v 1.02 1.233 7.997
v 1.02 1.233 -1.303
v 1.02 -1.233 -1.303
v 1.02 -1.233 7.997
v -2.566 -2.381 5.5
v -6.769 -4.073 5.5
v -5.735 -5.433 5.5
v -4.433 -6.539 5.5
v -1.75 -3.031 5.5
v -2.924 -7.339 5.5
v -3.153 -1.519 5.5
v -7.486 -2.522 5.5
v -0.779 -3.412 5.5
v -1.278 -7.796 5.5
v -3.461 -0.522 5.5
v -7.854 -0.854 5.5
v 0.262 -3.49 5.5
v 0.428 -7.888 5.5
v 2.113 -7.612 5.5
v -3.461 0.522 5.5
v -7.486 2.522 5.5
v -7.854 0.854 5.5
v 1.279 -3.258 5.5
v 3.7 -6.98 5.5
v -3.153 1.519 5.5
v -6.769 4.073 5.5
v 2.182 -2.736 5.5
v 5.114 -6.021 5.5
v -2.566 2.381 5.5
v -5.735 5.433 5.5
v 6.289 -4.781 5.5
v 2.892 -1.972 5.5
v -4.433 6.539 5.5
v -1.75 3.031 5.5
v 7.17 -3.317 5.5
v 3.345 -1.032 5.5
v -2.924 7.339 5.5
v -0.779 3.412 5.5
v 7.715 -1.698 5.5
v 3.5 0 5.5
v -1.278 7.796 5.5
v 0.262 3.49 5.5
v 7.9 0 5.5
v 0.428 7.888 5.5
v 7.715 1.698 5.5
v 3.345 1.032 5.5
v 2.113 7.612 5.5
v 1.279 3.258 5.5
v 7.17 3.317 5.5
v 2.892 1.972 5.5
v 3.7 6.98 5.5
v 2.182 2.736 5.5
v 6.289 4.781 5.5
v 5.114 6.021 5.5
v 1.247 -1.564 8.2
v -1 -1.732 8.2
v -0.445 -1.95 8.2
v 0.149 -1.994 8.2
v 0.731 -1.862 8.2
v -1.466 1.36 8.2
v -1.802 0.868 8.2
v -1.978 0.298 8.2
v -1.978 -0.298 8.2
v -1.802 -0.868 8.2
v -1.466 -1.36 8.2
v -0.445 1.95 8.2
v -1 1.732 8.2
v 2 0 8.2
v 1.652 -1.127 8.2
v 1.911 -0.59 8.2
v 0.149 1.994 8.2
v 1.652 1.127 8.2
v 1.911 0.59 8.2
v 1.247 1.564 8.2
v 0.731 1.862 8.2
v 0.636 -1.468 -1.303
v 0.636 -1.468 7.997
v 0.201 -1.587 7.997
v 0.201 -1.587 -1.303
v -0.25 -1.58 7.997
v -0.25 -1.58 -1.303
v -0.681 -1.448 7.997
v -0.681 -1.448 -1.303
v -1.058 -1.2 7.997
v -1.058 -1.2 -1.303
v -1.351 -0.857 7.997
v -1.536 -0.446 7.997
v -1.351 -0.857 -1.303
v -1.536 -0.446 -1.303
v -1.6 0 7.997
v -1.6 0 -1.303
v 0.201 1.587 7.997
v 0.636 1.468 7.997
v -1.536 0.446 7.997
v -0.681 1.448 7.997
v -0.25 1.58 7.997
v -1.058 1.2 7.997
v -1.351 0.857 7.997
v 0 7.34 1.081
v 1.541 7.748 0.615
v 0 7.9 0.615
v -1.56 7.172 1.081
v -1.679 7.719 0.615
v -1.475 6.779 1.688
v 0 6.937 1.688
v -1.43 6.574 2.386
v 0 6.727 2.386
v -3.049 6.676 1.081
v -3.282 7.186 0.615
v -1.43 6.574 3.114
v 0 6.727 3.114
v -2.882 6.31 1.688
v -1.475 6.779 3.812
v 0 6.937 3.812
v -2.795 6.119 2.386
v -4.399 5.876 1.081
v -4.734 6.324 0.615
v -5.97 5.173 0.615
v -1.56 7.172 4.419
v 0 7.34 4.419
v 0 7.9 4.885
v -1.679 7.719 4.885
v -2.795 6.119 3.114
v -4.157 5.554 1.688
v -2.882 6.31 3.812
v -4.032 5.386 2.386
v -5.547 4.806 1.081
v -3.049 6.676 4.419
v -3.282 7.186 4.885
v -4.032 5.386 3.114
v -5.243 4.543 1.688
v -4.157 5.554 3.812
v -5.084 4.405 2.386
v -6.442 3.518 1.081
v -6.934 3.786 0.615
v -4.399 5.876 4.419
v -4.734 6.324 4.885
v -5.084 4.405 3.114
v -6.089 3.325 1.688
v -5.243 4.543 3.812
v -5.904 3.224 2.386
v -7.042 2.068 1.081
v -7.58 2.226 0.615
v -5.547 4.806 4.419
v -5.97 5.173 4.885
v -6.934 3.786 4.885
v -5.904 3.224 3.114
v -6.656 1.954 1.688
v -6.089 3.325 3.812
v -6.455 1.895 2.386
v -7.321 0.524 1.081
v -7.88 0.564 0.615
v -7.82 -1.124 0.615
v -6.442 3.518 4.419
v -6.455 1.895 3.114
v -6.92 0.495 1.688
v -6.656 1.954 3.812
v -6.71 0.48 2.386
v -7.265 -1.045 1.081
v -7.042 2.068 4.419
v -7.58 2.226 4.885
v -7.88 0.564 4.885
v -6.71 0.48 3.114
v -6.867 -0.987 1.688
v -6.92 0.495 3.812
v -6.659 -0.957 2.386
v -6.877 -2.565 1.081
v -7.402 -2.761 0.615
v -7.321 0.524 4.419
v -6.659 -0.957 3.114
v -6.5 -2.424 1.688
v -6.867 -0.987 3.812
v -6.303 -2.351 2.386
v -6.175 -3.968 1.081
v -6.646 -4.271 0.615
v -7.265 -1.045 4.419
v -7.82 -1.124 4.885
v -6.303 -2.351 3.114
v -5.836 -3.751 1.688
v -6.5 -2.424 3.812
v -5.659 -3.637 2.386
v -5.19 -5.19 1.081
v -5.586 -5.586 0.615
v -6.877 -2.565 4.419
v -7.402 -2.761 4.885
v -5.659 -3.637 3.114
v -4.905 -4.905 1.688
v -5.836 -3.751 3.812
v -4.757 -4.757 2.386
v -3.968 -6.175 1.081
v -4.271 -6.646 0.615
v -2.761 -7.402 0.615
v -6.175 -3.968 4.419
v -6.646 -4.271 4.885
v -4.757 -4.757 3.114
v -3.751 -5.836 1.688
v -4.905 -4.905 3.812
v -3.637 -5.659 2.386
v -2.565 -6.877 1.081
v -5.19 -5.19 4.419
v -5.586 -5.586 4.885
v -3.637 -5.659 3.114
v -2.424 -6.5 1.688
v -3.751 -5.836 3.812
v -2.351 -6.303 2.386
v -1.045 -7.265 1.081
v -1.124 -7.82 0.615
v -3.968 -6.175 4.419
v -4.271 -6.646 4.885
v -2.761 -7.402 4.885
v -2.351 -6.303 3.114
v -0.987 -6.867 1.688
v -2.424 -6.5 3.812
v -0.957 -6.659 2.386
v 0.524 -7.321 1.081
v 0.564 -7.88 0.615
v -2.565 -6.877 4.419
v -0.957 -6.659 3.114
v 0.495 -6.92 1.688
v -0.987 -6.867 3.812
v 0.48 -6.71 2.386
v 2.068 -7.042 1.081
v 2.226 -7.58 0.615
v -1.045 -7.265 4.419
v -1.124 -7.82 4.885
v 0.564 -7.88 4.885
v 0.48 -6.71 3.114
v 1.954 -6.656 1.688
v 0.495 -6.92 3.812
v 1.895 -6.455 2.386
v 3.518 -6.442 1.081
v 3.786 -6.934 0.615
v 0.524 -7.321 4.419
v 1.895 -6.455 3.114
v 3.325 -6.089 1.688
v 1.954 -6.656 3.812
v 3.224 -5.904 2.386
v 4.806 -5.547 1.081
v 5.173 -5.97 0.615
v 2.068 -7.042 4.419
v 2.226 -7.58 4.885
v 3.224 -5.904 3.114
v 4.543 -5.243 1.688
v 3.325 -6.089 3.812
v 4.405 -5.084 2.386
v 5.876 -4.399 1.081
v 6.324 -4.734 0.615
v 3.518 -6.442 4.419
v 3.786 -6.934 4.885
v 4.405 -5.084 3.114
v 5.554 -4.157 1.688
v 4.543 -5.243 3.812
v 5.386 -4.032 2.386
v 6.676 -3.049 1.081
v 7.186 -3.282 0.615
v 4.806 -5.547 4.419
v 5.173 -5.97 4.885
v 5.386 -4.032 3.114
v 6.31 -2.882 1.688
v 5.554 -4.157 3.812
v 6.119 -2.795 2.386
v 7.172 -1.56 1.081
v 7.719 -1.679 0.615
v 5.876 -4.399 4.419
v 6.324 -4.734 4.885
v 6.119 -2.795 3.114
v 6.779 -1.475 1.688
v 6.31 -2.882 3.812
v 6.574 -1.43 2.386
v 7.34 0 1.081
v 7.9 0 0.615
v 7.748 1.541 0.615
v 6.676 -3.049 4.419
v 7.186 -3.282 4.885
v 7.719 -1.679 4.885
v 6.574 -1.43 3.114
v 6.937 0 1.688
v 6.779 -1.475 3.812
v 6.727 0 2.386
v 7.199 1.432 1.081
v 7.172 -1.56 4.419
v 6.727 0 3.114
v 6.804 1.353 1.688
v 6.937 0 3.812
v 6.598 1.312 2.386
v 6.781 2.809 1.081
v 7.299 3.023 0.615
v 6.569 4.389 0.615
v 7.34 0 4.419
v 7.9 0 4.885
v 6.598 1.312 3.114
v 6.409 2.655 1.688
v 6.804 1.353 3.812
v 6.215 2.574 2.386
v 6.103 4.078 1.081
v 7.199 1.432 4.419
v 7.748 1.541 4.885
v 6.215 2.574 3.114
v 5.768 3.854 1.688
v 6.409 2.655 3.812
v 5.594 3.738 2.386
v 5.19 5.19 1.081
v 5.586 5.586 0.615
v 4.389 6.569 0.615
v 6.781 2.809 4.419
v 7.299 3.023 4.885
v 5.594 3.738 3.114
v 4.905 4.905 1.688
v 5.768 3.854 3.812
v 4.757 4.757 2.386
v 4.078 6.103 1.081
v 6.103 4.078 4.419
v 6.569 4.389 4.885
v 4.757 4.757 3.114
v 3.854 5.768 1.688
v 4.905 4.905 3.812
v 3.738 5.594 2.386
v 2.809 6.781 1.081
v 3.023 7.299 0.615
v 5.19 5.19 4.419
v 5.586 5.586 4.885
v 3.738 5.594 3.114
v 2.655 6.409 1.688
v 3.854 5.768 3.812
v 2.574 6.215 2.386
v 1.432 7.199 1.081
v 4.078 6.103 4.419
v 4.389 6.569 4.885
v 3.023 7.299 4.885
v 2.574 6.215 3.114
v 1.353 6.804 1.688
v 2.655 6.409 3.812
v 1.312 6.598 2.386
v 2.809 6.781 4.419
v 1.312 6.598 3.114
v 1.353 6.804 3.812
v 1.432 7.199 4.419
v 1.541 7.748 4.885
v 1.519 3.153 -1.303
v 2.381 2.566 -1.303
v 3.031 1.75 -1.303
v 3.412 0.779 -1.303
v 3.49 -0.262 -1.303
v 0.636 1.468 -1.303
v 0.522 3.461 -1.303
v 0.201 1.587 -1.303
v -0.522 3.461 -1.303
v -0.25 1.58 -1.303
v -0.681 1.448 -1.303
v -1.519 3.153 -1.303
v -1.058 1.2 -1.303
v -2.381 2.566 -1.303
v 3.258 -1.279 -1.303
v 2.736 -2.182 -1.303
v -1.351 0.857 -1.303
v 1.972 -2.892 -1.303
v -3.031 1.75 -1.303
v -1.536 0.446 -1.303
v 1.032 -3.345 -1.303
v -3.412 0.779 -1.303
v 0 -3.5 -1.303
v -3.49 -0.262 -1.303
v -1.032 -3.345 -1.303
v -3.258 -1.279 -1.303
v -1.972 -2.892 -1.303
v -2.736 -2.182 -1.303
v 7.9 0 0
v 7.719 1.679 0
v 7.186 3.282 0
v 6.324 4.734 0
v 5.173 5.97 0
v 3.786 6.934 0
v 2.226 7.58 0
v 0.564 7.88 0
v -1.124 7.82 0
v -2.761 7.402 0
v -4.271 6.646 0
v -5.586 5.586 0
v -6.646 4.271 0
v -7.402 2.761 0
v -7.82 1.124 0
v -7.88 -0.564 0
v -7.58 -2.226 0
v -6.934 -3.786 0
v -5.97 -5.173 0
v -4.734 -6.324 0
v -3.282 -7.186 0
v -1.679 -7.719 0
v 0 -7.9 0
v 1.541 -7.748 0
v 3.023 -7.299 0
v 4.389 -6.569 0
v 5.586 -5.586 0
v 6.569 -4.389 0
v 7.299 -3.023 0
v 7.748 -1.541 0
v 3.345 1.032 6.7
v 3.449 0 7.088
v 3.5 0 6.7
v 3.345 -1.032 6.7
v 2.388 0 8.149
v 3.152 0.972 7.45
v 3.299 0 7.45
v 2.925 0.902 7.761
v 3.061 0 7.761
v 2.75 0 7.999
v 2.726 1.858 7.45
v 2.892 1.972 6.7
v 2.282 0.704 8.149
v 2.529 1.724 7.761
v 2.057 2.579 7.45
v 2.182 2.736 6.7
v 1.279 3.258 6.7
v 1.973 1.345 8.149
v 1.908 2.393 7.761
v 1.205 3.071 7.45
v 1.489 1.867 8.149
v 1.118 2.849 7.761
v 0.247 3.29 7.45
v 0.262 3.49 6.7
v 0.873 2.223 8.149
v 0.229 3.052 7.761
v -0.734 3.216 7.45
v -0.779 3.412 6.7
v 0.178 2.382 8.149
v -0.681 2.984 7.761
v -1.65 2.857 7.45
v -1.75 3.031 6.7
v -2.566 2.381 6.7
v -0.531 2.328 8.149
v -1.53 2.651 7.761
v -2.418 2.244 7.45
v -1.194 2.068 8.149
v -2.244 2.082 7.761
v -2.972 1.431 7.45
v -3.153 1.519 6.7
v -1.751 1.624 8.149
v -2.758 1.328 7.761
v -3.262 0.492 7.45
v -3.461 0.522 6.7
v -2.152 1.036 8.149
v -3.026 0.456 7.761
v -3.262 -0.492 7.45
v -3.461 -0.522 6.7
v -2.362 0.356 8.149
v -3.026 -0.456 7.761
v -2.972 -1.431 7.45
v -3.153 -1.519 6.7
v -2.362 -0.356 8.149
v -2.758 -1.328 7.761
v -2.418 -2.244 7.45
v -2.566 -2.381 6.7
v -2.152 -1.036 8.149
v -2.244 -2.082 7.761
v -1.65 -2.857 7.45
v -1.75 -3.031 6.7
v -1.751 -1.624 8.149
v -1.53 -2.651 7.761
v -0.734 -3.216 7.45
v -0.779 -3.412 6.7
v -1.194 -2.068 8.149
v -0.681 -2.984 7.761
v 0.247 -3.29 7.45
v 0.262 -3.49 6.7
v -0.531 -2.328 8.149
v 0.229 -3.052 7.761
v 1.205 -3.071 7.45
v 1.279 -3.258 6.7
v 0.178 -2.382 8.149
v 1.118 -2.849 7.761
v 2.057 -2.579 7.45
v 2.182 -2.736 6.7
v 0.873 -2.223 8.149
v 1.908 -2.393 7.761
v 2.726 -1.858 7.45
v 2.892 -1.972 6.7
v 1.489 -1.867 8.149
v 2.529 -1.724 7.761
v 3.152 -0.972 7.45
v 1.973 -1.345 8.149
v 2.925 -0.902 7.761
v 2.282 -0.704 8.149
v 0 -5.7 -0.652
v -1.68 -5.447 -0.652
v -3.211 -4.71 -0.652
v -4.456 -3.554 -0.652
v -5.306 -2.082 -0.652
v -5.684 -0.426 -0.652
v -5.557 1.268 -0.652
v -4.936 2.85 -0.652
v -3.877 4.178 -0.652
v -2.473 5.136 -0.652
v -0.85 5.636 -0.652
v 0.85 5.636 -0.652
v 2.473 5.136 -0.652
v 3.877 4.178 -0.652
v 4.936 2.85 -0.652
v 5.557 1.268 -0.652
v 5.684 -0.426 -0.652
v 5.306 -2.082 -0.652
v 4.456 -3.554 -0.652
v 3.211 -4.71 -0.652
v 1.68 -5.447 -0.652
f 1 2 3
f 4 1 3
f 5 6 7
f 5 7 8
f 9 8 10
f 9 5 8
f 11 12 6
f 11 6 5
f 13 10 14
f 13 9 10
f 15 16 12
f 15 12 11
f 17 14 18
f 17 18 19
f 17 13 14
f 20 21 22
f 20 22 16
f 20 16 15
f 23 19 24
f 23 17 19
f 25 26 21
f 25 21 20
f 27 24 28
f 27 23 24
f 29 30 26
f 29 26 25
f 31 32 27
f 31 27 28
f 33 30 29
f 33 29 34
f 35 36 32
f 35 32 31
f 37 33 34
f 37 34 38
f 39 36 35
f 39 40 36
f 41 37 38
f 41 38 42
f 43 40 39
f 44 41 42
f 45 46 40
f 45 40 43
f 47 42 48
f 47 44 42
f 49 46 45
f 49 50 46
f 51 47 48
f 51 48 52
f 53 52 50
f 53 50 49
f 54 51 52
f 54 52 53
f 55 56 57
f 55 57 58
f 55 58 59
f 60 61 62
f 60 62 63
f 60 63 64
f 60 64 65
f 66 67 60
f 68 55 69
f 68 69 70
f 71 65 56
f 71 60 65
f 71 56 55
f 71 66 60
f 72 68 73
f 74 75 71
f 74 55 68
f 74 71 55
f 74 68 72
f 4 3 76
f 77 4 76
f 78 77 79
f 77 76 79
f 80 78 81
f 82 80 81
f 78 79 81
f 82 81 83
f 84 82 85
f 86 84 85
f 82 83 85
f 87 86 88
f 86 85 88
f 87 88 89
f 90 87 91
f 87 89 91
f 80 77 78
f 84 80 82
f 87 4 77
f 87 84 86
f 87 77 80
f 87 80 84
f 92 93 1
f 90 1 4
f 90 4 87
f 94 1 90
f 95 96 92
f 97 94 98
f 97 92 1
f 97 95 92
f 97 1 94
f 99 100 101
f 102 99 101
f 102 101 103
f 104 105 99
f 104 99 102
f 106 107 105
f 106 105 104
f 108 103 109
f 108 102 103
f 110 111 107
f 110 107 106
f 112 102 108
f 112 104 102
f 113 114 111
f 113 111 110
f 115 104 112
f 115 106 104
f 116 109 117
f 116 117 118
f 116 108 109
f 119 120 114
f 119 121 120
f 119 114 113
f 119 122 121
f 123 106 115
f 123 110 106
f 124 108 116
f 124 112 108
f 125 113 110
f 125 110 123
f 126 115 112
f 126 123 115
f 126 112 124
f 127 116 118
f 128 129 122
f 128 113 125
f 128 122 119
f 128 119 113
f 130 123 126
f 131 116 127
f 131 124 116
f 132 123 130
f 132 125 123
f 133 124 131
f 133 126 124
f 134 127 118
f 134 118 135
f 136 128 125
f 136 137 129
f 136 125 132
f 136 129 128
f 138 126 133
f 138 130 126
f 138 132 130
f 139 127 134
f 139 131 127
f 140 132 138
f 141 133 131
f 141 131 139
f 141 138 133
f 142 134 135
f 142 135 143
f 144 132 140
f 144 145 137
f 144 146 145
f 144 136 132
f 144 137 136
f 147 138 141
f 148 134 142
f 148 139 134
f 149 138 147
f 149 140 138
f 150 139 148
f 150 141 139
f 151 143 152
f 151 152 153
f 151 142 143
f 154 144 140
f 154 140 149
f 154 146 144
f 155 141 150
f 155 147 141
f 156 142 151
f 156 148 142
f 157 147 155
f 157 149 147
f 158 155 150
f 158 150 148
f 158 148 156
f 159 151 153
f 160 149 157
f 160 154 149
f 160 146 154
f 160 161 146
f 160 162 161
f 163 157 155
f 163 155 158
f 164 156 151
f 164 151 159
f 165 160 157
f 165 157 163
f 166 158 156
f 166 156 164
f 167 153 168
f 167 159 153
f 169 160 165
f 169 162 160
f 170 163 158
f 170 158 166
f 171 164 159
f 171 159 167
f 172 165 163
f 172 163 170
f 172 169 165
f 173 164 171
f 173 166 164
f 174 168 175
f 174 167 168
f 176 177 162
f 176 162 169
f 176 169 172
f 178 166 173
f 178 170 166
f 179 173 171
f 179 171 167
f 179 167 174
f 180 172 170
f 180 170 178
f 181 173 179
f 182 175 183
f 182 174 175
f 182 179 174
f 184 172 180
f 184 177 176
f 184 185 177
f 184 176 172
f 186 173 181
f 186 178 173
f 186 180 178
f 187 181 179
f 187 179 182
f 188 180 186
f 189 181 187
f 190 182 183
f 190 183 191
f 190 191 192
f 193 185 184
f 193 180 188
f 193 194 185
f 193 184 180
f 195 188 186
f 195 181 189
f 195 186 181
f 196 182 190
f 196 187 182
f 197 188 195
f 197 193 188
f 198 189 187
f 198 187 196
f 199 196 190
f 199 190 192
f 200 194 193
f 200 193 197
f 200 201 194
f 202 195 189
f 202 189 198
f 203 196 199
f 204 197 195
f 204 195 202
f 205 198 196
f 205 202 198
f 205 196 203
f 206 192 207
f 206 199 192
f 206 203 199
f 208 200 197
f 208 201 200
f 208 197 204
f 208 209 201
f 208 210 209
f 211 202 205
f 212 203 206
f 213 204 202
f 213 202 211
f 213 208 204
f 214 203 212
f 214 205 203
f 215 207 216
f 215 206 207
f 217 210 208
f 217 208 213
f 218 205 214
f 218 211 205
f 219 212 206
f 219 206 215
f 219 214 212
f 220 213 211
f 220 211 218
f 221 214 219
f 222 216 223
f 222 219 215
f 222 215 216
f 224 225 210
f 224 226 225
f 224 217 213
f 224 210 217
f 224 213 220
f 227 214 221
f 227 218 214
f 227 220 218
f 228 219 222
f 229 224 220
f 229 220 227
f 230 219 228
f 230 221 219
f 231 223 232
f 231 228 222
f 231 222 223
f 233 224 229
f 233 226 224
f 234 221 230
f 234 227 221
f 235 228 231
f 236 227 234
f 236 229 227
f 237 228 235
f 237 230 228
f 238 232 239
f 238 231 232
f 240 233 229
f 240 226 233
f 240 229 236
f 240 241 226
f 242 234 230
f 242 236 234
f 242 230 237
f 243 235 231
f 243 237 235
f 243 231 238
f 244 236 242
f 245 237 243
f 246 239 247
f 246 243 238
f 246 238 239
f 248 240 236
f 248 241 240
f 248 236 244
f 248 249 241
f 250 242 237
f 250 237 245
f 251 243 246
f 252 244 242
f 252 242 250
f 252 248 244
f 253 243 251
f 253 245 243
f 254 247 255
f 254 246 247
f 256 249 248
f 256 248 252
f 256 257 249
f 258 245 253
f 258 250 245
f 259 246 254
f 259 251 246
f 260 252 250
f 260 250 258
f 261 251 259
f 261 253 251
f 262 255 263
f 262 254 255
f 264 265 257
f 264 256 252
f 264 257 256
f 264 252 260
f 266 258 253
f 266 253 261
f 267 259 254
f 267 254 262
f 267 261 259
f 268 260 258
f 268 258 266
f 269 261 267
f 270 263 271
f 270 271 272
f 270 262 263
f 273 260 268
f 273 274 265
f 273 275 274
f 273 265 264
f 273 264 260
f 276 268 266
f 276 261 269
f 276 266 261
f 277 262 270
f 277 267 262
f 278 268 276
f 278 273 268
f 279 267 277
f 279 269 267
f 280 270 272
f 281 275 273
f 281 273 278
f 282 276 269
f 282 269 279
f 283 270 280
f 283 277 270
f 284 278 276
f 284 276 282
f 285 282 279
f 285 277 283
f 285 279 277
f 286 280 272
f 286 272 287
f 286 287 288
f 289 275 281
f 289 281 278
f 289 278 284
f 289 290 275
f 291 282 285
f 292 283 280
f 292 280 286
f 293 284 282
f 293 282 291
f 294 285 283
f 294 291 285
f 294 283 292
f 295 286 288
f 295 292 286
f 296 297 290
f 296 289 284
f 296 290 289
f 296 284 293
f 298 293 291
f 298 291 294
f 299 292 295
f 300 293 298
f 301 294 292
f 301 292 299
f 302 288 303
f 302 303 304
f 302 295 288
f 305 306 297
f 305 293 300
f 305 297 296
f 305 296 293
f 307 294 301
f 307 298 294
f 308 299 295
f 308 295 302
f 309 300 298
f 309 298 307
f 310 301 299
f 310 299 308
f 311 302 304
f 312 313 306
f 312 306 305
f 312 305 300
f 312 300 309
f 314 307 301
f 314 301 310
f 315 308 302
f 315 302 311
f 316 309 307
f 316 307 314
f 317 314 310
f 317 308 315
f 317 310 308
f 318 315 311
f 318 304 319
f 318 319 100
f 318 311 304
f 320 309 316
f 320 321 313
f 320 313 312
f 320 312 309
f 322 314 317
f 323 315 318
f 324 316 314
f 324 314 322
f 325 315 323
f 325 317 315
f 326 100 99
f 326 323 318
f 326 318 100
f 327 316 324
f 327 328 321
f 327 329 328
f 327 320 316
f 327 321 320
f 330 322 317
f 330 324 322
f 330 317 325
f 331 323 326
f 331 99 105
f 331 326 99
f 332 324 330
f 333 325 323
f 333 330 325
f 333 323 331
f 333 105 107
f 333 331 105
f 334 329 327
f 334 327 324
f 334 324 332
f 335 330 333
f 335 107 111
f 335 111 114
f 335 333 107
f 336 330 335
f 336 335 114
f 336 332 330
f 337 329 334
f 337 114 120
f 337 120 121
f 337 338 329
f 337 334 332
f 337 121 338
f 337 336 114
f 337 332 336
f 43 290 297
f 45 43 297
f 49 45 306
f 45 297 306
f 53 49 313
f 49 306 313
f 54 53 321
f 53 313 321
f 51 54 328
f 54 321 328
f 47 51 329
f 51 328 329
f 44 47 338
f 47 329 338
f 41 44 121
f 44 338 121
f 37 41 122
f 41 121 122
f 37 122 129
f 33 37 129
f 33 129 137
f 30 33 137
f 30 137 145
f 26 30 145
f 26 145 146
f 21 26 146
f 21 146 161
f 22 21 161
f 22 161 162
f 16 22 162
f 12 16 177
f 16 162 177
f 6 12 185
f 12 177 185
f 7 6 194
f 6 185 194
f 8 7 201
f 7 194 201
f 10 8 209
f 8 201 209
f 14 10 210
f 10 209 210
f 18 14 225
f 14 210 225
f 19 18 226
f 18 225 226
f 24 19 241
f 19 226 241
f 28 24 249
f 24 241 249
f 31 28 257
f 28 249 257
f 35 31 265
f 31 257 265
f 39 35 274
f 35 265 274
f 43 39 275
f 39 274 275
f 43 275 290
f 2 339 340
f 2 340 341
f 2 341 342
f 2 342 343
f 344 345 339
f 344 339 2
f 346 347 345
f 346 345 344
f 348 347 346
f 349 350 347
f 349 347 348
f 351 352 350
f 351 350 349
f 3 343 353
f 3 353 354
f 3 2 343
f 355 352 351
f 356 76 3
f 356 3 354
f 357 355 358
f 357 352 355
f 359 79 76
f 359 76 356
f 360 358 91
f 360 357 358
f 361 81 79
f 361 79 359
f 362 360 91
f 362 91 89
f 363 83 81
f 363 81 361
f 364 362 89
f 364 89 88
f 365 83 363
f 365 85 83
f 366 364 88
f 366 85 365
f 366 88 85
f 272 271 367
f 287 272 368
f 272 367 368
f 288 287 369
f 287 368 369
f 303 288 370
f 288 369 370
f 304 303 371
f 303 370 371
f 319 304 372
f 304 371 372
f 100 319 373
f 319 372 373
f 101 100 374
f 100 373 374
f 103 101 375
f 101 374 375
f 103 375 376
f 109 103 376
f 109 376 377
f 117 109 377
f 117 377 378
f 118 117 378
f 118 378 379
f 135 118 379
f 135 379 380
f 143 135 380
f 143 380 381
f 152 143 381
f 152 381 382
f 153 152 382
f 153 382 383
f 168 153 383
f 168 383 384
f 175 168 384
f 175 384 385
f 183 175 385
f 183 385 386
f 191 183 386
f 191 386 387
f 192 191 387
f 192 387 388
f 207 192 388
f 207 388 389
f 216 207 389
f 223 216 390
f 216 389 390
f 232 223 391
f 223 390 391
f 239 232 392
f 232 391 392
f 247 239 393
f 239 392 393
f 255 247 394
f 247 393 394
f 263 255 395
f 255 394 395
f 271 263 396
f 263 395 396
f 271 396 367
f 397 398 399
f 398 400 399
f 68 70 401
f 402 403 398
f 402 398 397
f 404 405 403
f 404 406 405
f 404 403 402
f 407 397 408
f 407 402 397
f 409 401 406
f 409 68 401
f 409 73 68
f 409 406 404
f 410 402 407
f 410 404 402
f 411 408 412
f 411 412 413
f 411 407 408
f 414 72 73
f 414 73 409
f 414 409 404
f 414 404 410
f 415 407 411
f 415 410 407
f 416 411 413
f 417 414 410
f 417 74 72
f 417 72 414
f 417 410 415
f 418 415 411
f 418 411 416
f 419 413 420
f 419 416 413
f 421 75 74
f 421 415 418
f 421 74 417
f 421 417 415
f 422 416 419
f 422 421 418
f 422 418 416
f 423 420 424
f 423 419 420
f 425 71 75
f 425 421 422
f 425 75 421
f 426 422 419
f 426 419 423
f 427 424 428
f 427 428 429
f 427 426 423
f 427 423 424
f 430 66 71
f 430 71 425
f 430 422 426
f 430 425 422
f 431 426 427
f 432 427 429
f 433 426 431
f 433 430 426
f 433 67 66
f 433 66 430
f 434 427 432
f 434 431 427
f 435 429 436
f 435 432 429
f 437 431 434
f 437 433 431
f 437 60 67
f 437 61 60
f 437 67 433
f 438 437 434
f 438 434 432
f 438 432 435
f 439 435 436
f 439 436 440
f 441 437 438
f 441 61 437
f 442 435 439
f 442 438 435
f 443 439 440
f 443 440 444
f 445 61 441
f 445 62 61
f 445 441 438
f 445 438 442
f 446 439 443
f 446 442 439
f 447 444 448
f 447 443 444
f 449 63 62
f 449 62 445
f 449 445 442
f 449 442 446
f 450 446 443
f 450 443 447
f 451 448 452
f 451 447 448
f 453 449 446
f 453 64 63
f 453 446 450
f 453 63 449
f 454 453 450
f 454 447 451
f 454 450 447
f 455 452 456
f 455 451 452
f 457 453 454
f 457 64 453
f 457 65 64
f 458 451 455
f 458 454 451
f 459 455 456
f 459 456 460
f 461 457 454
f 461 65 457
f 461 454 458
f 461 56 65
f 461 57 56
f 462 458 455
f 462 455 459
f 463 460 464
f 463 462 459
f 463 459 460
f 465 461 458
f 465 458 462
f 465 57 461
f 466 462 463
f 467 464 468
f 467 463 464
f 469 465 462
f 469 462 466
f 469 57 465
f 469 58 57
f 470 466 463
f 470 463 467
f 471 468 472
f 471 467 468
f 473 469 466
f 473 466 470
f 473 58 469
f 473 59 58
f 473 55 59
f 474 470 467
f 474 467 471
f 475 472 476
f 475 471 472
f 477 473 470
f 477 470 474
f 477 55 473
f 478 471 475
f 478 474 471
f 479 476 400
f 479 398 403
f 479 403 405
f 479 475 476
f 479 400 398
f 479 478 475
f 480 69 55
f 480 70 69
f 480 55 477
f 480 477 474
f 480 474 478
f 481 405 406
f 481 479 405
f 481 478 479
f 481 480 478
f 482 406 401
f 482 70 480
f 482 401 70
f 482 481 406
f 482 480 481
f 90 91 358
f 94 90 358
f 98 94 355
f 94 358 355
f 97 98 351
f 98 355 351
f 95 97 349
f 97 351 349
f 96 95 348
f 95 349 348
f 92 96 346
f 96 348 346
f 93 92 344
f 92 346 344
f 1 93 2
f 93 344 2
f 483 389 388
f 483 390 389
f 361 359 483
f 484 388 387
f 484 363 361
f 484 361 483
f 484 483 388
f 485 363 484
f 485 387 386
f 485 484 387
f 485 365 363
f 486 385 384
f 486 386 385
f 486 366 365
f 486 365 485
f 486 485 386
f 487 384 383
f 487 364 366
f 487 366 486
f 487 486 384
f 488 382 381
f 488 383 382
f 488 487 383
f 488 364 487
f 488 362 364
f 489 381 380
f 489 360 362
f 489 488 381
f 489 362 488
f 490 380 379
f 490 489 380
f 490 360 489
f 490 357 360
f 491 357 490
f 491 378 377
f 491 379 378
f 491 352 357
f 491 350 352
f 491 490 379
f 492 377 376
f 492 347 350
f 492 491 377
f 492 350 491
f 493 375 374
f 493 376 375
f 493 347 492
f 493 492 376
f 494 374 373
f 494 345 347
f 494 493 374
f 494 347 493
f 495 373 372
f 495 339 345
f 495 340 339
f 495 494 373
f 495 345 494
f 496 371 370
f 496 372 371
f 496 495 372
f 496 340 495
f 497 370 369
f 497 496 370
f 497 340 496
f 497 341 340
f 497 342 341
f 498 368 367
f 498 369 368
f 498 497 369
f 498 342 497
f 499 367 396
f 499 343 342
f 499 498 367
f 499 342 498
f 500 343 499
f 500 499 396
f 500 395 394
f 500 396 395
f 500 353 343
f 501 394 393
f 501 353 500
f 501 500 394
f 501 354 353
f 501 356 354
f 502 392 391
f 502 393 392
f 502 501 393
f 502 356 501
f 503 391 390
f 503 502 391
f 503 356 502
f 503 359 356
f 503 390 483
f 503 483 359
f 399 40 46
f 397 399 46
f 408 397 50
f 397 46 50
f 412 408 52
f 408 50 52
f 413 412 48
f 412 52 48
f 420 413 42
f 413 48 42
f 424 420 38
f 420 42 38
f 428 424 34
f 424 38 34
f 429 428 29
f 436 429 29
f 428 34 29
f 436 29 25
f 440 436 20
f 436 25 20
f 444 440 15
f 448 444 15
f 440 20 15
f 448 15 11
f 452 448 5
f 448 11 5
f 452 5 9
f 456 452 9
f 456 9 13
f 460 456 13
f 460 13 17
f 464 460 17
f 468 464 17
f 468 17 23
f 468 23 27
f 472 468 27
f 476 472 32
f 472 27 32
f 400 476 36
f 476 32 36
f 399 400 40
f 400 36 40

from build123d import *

# Parameters (mm, degrees)
SKETCH_1_R          = 7.9
EXTRUDE_1_DEPTH     = 5.5
SKETCH_2_R          = 3.5
EXTRUDE_2_DEPTH     = 2.7
CUT_EXTRUDE_1_DEPTH = 9.3
FILLET_1_R          = 1.5


with BuildPart() as part:
    # 스케치1 → 보스-돌출1 (new body)
    with BuildSketch(Plane.XY):
        Circle(SKETCH_1_R)
    extrude(amount=EXTRUDE_1_DEPTH)

    # 스케치2 → 보스-돌출2 (add)
    with BuildSketch(Plane.XY.offset(5.5)):
        Circle(SKETCH_2_R)
    extrude(amount=EXTRUDE_2_DEPTH)

    # 스케치6 → 회전1 (revolve)
    with BuildSketch(Plane(origin=(0, 0, 0), x_dir=(0, 0, -1), z_dir=(1, 0, 0))):
        Polygon((0, -7.9), (1.303339378, -3.5), (1.303339378, 0), (0, 0), align=None)
    revolve(axis=Axis((0, 0, 0), (0, 0, -1)))

    # 스케치7 → 컷-돌출1 (cut)
    with BuildSketch(Plane(origin=(0, 0, -1.303339378), x_dir=(-1, 0, 0), z_dir=(0, 0, -1))):
        with BuildLine():
            ThreePointArc((1.6, 0), (0.681175455, 1.447756886), (-1.02, 1.232720568))
            Line((-1.02, 1.232720568), (-1.02, -1.232720568))
            ThreePointArc((-1.02, -1.232720568), (0.681175455, -1.447756886), (1.6, 0))
        make_face()
    extrude(amount=-CUT_EXTRUDE_1_DEPTH, mode=Mode.SUBTRACT)

    # 필렛1
    fillet_1_edges = [part.edges().sort_by_distance(p)[0] for p in [
        (-3.5, 0, 8.2),
    ]]
    fillet(fillet_1_edges, radius=FILLET_1_R)

    # 스케치8 → 컷-회전1 (revolve, cut)
    with BuildSketch(Plane(origin=(0, 0, 0), x_dir=(0, 0, -1), z_dir=(1, 0, 0))):
        with BuildLine():
            Line((-4.885, 7.9), (-0.615, 7.9))
            ThreePointArc((-0.615, 7.9), (-2.75, 6.700682513), (-4.885, 7.9))
        make_face()
    revolve(axis=Axis((0, 0, 0), (0, 0, 1)), mode=Mode.SUBTRACT)


solid = part.part
